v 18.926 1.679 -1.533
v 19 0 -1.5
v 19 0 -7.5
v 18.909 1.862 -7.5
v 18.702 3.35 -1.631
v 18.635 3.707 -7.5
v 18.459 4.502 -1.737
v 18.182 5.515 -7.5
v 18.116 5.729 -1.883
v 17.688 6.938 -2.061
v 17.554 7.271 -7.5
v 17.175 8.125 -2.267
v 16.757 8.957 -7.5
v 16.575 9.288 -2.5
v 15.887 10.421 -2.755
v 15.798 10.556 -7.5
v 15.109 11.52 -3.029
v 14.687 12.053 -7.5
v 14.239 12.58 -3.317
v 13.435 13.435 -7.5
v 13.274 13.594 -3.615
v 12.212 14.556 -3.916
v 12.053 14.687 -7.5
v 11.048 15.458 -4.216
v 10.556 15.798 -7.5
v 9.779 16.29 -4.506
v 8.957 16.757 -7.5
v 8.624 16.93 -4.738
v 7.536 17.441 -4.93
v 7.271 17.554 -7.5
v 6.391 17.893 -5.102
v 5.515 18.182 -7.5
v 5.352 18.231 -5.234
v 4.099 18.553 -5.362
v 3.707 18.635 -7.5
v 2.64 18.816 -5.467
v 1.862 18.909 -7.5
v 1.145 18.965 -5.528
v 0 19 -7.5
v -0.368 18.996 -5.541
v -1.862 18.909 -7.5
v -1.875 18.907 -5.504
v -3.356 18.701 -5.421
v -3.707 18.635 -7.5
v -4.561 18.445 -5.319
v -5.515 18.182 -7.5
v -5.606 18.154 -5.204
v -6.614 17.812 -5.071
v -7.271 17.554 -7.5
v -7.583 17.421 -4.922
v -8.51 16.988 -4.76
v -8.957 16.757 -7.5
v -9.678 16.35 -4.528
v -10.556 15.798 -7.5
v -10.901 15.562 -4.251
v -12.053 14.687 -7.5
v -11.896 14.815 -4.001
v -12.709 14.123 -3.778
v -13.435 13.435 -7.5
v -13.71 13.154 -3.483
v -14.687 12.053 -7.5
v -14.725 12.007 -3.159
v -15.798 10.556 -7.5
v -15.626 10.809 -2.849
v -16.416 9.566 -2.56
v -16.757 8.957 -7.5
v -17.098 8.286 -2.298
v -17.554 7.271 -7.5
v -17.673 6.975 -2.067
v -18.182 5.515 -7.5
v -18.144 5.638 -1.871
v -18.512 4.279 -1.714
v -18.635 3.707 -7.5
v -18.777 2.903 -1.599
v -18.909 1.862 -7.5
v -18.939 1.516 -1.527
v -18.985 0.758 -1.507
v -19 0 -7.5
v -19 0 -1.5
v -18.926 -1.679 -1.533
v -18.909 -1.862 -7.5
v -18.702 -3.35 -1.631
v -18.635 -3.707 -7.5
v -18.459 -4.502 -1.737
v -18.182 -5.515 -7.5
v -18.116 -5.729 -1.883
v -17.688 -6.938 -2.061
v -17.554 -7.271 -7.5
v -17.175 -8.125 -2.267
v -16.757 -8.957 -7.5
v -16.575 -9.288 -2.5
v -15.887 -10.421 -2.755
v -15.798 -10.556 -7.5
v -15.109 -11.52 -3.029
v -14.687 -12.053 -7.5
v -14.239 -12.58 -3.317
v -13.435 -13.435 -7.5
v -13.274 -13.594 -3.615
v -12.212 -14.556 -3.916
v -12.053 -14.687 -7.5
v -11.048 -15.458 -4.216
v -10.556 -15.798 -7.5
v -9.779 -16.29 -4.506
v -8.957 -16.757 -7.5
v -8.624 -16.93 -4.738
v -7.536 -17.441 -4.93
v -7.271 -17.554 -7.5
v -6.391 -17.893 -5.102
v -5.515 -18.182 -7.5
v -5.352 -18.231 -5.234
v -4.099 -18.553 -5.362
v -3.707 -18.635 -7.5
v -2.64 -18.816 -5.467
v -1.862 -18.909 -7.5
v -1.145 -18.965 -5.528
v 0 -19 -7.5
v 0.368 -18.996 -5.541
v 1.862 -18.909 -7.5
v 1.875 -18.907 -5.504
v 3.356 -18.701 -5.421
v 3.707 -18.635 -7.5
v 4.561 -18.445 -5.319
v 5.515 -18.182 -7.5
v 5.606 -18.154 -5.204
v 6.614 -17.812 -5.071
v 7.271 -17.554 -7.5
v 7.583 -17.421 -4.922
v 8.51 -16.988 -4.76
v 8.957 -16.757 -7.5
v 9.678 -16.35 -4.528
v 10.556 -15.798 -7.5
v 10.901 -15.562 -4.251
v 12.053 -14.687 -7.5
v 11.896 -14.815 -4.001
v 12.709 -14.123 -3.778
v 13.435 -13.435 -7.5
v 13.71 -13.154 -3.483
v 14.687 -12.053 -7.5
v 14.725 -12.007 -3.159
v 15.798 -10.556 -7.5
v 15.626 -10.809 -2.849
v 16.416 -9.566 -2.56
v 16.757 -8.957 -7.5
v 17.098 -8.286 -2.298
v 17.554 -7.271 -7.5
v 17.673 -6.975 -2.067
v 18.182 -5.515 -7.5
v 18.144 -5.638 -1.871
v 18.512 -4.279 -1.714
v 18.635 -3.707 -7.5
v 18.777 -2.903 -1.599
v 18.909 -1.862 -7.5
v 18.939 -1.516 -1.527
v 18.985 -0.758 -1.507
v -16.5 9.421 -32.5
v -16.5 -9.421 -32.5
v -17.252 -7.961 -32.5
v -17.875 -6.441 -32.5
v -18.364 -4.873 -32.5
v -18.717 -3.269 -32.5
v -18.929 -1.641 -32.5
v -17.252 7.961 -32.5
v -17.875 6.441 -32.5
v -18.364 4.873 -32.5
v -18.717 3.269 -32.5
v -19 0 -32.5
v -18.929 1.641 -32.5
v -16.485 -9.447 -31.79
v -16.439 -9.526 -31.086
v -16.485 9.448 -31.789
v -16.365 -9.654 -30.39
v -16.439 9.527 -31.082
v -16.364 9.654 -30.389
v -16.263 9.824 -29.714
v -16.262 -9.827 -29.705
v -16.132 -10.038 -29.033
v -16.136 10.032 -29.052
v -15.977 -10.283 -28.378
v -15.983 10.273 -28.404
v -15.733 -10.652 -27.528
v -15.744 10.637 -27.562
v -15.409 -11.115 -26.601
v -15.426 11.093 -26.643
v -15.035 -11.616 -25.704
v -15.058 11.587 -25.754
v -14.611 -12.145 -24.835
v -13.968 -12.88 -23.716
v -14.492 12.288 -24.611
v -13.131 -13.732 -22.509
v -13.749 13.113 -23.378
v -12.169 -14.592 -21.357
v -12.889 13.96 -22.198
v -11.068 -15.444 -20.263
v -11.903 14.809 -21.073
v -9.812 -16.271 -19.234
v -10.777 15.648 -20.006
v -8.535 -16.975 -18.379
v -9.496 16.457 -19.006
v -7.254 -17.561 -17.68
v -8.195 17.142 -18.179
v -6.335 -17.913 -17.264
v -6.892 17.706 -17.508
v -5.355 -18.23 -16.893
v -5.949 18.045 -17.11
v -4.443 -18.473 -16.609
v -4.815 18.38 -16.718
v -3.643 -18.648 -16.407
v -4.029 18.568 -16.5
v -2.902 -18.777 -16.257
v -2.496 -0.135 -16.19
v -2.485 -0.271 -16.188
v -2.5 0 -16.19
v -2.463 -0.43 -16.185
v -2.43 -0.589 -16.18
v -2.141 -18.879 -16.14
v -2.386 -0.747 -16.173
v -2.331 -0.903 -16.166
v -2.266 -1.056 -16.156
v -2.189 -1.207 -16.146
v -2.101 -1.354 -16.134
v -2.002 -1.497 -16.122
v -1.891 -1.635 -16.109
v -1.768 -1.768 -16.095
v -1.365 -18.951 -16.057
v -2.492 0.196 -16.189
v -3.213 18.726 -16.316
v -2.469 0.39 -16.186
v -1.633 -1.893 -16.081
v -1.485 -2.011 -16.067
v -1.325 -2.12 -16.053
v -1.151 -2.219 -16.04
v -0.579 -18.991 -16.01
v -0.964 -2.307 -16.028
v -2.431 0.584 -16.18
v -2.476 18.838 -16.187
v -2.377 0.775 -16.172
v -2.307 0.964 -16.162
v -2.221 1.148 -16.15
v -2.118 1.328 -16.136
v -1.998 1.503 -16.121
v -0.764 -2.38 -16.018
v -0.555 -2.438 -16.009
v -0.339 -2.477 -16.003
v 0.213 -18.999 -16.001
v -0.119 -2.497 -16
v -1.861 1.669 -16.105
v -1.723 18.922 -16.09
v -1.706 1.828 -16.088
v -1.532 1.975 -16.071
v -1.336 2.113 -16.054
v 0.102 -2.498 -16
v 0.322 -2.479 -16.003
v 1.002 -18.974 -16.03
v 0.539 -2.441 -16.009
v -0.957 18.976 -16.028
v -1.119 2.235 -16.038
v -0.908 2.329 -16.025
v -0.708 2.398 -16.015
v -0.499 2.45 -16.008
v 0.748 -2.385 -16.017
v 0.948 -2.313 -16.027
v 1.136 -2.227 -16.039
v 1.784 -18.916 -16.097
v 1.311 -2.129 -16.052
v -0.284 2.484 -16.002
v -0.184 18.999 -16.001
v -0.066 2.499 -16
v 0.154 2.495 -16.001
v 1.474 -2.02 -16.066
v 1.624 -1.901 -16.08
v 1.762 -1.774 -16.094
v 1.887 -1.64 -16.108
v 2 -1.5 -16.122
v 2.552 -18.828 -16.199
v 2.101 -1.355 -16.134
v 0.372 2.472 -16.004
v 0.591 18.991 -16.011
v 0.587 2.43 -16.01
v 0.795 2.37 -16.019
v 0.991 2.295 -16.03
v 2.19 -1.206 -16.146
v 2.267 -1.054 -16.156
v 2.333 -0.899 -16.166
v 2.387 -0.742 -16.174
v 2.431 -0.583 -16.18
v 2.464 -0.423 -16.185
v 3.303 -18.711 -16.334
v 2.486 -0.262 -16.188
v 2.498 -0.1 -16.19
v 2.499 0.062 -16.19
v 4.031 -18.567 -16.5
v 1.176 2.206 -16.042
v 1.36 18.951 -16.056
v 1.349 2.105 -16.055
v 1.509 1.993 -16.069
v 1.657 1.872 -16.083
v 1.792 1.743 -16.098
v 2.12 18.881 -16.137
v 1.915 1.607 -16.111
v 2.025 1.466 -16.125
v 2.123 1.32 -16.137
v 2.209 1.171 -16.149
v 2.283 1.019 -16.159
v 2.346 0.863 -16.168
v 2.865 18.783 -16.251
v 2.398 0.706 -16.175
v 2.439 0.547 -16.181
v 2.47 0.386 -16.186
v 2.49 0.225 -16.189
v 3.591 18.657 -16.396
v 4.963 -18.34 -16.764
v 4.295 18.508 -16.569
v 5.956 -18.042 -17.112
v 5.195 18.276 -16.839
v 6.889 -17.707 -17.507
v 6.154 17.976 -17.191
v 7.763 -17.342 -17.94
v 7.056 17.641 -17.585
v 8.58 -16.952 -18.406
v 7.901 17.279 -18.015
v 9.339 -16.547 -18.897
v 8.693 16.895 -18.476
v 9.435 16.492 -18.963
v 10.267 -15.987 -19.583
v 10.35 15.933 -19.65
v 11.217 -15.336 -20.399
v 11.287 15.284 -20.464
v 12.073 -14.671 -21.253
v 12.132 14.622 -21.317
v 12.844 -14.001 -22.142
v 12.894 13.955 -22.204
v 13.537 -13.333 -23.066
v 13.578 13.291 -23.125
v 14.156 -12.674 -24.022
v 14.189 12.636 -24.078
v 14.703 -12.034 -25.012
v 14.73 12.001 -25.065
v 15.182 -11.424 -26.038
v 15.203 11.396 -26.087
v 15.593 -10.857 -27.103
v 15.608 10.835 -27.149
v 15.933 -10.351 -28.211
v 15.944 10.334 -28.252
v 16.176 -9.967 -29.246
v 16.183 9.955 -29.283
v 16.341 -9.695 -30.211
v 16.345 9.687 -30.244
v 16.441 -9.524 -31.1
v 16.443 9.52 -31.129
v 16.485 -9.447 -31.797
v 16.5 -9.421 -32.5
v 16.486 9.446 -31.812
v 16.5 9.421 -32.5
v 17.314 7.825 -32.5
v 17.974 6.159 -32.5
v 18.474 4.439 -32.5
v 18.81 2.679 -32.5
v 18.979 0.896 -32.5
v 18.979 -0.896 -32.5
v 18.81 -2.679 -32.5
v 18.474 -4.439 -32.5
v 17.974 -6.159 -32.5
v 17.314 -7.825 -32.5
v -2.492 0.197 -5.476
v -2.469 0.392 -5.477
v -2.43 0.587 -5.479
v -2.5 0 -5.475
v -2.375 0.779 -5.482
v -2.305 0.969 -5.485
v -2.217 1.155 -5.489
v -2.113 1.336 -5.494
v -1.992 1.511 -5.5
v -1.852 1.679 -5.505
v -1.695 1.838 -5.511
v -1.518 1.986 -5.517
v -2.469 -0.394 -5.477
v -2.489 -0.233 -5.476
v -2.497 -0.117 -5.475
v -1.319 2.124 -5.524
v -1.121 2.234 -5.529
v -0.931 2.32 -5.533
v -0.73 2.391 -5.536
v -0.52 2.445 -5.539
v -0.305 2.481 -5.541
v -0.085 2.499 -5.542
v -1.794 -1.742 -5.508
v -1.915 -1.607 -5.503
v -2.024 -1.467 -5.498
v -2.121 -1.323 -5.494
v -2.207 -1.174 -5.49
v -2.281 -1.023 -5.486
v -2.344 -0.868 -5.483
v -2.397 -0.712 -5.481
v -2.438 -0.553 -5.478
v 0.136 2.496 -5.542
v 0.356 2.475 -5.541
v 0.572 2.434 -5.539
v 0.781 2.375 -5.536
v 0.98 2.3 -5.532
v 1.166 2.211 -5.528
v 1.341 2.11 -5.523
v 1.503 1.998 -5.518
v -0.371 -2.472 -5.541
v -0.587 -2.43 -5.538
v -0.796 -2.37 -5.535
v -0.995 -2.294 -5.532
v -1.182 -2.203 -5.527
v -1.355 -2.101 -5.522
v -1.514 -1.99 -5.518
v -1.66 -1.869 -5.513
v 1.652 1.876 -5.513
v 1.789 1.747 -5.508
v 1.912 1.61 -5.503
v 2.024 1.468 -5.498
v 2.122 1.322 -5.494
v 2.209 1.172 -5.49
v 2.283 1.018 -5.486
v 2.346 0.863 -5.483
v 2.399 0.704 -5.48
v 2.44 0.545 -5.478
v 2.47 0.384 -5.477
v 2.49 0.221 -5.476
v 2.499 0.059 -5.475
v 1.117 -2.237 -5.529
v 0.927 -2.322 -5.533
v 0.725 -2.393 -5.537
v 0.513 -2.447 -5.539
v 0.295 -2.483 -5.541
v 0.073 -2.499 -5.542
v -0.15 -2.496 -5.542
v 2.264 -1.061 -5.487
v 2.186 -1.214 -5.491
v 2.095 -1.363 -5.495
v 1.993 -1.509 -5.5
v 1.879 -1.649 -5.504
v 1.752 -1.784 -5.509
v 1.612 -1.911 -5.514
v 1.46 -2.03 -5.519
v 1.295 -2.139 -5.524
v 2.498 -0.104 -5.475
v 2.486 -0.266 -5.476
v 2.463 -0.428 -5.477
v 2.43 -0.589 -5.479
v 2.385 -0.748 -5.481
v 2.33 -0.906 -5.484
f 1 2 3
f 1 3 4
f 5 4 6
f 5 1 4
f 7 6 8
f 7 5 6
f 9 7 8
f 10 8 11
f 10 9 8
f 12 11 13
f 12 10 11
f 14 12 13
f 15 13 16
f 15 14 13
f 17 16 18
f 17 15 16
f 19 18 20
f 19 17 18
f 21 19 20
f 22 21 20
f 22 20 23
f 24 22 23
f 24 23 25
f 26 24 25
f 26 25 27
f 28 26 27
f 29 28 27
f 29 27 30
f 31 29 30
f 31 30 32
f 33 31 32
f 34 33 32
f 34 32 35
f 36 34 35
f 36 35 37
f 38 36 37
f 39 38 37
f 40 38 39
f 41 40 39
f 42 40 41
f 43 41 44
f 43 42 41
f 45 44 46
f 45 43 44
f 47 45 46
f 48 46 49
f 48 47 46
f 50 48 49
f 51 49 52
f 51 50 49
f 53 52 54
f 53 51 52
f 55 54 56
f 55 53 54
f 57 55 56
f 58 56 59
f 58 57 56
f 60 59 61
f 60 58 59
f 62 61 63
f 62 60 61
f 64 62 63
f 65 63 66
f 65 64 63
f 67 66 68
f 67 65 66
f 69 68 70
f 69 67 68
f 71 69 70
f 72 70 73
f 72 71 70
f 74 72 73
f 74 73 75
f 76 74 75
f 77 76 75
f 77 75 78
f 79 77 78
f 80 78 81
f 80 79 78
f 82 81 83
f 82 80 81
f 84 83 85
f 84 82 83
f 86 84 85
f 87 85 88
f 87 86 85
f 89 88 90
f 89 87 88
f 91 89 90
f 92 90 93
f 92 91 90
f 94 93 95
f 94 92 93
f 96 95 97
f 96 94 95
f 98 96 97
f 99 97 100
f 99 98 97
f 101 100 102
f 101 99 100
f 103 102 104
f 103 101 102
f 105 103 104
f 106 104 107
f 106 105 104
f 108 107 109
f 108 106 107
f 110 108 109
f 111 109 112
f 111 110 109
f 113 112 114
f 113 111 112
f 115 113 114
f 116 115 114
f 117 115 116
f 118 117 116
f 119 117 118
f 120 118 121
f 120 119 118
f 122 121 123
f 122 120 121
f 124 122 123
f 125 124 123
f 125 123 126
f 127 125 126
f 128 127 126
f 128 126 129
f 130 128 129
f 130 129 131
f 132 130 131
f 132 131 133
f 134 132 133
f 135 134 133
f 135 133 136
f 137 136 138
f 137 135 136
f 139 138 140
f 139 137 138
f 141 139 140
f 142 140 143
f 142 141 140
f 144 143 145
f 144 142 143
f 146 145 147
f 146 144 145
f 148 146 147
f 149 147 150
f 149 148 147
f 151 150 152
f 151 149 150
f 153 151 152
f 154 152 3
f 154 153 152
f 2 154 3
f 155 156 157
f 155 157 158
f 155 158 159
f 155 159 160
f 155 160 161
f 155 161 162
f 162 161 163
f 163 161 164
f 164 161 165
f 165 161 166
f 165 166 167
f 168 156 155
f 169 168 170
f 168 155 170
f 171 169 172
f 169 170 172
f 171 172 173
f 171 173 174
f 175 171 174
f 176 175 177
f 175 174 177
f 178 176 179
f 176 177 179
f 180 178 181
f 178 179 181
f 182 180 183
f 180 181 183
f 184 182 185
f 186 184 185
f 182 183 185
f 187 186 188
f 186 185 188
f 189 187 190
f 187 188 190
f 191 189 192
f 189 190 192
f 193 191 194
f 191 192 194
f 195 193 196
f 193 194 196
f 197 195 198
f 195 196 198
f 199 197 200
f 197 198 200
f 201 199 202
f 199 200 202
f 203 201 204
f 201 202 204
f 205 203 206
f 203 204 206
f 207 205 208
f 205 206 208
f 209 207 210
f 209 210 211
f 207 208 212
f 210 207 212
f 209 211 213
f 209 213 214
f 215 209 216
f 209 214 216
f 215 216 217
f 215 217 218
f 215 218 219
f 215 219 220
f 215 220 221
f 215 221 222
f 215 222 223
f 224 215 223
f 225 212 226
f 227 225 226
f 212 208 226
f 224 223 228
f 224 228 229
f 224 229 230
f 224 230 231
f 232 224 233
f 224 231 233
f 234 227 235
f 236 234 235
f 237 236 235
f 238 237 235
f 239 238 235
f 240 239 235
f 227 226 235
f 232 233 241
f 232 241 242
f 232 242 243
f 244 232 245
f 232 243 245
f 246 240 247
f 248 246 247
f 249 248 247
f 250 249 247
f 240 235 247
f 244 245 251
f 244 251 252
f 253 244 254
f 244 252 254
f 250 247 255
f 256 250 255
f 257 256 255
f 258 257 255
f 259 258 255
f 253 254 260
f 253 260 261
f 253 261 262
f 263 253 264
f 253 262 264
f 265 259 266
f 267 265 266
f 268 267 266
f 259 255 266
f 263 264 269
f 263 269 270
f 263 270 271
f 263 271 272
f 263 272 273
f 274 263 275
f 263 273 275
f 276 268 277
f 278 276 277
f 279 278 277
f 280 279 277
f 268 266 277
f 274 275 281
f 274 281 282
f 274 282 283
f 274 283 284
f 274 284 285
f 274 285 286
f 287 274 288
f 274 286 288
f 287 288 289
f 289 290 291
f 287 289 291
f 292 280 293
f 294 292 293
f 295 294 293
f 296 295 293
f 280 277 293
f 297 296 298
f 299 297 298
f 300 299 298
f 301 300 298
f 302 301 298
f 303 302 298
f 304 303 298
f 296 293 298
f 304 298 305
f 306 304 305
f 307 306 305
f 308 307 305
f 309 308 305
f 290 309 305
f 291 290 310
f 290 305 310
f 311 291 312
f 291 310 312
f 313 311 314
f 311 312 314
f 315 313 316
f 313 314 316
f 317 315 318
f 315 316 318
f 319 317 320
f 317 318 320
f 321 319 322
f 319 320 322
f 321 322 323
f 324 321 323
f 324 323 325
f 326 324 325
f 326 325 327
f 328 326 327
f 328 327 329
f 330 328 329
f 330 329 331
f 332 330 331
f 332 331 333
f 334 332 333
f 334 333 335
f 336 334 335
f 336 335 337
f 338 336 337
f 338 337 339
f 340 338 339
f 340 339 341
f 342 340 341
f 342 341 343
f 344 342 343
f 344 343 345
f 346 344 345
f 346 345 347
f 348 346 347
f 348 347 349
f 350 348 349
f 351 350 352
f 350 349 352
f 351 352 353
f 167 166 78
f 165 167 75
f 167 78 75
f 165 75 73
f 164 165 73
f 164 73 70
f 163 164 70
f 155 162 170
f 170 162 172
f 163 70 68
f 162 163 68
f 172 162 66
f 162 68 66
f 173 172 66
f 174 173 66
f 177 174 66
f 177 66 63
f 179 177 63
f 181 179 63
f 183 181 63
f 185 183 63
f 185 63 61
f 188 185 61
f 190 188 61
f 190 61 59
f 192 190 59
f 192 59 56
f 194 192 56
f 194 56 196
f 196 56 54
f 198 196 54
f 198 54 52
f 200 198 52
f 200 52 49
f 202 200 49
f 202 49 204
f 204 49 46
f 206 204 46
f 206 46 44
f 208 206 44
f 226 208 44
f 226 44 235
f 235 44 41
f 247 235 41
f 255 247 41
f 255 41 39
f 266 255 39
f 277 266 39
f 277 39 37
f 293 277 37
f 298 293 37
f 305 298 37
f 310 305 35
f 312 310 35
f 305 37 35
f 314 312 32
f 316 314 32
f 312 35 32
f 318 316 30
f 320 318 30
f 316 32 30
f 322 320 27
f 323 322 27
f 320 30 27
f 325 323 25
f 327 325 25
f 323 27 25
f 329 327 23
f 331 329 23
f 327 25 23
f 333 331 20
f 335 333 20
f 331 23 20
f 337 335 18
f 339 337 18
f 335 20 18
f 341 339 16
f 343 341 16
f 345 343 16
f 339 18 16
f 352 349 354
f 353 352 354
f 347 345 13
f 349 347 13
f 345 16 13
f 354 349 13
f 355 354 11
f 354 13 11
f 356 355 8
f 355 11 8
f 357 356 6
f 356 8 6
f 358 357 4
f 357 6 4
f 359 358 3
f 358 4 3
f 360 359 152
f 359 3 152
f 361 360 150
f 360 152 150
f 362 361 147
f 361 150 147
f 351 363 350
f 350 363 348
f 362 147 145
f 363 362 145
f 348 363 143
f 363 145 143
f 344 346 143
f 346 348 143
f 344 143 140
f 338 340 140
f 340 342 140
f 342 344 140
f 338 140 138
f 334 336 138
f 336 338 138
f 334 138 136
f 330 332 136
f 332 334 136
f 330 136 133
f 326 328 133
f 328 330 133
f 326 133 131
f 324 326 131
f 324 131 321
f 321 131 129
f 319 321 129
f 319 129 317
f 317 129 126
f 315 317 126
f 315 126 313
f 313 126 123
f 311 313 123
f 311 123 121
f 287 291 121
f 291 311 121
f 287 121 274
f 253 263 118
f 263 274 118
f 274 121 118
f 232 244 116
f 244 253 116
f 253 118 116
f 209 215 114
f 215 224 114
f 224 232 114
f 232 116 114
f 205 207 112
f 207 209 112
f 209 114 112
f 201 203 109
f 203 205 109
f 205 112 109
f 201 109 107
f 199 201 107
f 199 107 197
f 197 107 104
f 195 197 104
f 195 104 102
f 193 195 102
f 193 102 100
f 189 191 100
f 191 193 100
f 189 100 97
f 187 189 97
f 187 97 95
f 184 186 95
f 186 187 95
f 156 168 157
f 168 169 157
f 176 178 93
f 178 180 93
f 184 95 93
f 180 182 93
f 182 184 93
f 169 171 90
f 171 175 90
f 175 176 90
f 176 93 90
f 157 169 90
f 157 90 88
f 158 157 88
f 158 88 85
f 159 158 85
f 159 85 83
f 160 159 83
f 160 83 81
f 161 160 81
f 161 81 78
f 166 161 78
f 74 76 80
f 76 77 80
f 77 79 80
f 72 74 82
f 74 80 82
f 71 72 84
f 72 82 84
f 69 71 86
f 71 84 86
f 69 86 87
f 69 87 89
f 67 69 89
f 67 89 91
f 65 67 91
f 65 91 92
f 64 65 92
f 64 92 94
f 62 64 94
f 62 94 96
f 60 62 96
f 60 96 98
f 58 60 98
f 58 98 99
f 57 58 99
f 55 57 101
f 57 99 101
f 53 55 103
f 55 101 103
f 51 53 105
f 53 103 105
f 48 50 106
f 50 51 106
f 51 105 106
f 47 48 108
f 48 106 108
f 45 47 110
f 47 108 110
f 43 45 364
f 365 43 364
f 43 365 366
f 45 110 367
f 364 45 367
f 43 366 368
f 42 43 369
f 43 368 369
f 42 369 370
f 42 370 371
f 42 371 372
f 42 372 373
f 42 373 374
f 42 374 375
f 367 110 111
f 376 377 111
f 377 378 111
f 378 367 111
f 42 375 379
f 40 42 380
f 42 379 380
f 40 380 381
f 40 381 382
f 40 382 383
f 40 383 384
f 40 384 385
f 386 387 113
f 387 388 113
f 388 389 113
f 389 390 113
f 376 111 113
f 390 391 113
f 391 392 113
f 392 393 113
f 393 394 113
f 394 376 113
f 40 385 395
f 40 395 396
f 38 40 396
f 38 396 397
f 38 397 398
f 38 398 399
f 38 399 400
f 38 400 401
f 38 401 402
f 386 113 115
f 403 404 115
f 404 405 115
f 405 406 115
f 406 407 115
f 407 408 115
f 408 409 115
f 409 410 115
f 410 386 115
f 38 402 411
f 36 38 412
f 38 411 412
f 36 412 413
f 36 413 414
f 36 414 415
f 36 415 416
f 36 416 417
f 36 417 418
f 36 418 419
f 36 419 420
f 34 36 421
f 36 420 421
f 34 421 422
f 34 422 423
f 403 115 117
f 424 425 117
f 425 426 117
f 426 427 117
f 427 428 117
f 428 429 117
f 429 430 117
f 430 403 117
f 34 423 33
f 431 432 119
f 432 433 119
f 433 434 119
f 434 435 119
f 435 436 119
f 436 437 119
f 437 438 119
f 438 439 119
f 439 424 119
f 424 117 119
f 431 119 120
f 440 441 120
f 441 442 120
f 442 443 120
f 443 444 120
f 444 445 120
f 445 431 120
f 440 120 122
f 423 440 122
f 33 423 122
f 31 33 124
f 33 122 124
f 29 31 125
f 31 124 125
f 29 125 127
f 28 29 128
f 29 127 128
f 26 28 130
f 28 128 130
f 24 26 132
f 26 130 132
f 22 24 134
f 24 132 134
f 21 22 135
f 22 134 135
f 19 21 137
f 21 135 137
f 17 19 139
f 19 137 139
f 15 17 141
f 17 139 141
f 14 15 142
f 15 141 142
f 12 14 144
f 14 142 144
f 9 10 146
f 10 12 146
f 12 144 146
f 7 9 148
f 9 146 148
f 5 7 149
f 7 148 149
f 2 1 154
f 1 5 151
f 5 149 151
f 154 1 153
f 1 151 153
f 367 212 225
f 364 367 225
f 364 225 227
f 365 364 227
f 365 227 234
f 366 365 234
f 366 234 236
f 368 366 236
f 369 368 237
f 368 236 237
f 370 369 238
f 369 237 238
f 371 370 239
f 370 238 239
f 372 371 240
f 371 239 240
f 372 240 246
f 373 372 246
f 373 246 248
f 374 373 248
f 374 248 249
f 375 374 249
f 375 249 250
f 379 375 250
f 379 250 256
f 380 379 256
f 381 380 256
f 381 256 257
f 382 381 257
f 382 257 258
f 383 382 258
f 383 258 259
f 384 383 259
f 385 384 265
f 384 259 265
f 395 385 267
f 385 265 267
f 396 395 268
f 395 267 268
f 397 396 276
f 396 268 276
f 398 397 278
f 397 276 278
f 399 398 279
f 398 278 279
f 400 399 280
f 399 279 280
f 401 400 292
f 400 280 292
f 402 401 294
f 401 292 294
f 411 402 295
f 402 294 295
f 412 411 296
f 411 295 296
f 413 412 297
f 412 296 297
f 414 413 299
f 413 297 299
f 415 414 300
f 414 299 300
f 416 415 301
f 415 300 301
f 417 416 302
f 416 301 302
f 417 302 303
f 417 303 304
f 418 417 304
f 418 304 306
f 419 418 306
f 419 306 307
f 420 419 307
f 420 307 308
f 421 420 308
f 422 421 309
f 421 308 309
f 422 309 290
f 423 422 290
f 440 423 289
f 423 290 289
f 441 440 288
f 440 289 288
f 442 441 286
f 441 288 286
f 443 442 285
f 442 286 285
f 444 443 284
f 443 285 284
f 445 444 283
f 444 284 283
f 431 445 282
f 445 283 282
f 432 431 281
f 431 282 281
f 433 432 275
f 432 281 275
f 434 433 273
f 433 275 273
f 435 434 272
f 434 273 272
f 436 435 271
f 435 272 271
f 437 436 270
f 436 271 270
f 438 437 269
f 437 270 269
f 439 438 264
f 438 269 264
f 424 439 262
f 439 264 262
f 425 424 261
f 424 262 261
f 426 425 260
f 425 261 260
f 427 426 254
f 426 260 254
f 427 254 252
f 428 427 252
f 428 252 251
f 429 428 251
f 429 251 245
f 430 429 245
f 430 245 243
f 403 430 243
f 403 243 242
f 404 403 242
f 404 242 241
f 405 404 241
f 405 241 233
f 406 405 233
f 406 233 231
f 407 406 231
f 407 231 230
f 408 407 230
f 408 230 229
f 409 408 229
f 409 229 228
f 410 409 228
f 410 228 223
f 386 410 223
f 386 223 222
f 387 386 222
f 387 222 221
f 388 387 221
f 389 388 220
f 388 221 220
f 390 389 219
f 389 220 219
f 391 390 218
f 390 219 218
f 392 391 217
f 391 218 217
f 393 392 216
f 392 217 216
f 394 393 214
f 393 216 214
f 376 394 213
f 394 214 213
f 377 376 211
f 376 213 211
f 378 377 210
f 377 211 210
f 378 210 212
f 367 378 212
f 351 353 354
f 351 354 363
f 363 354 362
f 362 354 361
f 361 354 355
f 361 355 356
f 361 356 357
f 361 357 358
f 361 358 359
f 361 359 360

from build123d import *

# Parameters (mm, degrees)
ESBO_O1_R                  = 19
RESSALTO_EXTRUS_O1_DEPTH   = 7.5
CORTE_EXTRUS_O1_DEPTH      = 28.897132469
CORTE_EXTRUS_O1_DEPTH_BACK = 28.897132469
ESBO_O7_R                  = 19
RESSALTO_EXTRUS_O3_DEPTH   = 25
ESBO_O8_R                  = 16.5
CORTE_EXTRUS_O2_DEPTH      = 29
FURO_ROSCADO_DE_M62_D      = 5


with BuildPart() as part:
    # Esboço1 → Ressalto-extrusão1 (new, symmetric)
    with BuildSketch(Plane.XY):
        Circle(ESBO_O1_R)
    extrude(amount=RESSALTO_EXTRUS_O1_DEPTH, both=True)

    # Esboço2 → Corte-extrusão1 (cut, two sides: drawn at the far end of the back side and taken through both)
    with BuildSketch(Plane(origin=(0, 0, 0), x_dir=(1, 0, 0), z_dir=(0, 1, 0)).offset(-CORTE_EXTRUS_O1_DEPTH_BACK)):
        with BuildLine():
            Line((-99.472761542, -34.36341569), (-19, 1.5))
            ThreePointArc((-19, 1.5), (0, 5.542140614), (19, 1.5))
            Line((19, 1.5), (99.472761542, -34.36341569))
            Line((99.472761542, -34.36341569), (99.472761542, -210.568409208))
            Line((99.472761542, -210.568409208), (-99.472761542, -210.568409208))
            Line((-99.472761542, -210.568409208), (-99.472761542, -34.36341569))
        make_face()
    extrude(amount=CORTE_EXTRUS_O1_DEPTH + CORTE_EXTRUS_O1_DEPTH_BACK, mode=Mode.SUBTRACT)

    # Esboço7 → Ressalto-extrusão3 (add)
    with BuildSketch(Plane(origin=(0, 0, -7.5), x_dir=(-1, 0, 0), z_dir=(0, 0, -1))):
        Circle(ESBO_O7_R)
    extrude(amount=RESSALTO_EXTRUS_O3_DEPTH)

    # Esboço8 → Corte-extrusão2 (cut, symmetric)
    with BuildSketch(Plane(origin=(0, 0, 0), x_dir=(1, 0, 0), z_dir=(0, 1, 0))):
        with Locations((0, 32.5)):
            Circle(ESBO_O8_R)
    extrude(amount=CORTE_EXTRUS_O2_DEPTH, both=True, mode=Mode.SUBTRACT)

    # Furo roscado de M62 (through all)
    with Locations(Plane.XY):
        with Locations((0, 0)):
            Hole(FURO_ROSCADO_DE_M62_D / 2)


solid = part.part
